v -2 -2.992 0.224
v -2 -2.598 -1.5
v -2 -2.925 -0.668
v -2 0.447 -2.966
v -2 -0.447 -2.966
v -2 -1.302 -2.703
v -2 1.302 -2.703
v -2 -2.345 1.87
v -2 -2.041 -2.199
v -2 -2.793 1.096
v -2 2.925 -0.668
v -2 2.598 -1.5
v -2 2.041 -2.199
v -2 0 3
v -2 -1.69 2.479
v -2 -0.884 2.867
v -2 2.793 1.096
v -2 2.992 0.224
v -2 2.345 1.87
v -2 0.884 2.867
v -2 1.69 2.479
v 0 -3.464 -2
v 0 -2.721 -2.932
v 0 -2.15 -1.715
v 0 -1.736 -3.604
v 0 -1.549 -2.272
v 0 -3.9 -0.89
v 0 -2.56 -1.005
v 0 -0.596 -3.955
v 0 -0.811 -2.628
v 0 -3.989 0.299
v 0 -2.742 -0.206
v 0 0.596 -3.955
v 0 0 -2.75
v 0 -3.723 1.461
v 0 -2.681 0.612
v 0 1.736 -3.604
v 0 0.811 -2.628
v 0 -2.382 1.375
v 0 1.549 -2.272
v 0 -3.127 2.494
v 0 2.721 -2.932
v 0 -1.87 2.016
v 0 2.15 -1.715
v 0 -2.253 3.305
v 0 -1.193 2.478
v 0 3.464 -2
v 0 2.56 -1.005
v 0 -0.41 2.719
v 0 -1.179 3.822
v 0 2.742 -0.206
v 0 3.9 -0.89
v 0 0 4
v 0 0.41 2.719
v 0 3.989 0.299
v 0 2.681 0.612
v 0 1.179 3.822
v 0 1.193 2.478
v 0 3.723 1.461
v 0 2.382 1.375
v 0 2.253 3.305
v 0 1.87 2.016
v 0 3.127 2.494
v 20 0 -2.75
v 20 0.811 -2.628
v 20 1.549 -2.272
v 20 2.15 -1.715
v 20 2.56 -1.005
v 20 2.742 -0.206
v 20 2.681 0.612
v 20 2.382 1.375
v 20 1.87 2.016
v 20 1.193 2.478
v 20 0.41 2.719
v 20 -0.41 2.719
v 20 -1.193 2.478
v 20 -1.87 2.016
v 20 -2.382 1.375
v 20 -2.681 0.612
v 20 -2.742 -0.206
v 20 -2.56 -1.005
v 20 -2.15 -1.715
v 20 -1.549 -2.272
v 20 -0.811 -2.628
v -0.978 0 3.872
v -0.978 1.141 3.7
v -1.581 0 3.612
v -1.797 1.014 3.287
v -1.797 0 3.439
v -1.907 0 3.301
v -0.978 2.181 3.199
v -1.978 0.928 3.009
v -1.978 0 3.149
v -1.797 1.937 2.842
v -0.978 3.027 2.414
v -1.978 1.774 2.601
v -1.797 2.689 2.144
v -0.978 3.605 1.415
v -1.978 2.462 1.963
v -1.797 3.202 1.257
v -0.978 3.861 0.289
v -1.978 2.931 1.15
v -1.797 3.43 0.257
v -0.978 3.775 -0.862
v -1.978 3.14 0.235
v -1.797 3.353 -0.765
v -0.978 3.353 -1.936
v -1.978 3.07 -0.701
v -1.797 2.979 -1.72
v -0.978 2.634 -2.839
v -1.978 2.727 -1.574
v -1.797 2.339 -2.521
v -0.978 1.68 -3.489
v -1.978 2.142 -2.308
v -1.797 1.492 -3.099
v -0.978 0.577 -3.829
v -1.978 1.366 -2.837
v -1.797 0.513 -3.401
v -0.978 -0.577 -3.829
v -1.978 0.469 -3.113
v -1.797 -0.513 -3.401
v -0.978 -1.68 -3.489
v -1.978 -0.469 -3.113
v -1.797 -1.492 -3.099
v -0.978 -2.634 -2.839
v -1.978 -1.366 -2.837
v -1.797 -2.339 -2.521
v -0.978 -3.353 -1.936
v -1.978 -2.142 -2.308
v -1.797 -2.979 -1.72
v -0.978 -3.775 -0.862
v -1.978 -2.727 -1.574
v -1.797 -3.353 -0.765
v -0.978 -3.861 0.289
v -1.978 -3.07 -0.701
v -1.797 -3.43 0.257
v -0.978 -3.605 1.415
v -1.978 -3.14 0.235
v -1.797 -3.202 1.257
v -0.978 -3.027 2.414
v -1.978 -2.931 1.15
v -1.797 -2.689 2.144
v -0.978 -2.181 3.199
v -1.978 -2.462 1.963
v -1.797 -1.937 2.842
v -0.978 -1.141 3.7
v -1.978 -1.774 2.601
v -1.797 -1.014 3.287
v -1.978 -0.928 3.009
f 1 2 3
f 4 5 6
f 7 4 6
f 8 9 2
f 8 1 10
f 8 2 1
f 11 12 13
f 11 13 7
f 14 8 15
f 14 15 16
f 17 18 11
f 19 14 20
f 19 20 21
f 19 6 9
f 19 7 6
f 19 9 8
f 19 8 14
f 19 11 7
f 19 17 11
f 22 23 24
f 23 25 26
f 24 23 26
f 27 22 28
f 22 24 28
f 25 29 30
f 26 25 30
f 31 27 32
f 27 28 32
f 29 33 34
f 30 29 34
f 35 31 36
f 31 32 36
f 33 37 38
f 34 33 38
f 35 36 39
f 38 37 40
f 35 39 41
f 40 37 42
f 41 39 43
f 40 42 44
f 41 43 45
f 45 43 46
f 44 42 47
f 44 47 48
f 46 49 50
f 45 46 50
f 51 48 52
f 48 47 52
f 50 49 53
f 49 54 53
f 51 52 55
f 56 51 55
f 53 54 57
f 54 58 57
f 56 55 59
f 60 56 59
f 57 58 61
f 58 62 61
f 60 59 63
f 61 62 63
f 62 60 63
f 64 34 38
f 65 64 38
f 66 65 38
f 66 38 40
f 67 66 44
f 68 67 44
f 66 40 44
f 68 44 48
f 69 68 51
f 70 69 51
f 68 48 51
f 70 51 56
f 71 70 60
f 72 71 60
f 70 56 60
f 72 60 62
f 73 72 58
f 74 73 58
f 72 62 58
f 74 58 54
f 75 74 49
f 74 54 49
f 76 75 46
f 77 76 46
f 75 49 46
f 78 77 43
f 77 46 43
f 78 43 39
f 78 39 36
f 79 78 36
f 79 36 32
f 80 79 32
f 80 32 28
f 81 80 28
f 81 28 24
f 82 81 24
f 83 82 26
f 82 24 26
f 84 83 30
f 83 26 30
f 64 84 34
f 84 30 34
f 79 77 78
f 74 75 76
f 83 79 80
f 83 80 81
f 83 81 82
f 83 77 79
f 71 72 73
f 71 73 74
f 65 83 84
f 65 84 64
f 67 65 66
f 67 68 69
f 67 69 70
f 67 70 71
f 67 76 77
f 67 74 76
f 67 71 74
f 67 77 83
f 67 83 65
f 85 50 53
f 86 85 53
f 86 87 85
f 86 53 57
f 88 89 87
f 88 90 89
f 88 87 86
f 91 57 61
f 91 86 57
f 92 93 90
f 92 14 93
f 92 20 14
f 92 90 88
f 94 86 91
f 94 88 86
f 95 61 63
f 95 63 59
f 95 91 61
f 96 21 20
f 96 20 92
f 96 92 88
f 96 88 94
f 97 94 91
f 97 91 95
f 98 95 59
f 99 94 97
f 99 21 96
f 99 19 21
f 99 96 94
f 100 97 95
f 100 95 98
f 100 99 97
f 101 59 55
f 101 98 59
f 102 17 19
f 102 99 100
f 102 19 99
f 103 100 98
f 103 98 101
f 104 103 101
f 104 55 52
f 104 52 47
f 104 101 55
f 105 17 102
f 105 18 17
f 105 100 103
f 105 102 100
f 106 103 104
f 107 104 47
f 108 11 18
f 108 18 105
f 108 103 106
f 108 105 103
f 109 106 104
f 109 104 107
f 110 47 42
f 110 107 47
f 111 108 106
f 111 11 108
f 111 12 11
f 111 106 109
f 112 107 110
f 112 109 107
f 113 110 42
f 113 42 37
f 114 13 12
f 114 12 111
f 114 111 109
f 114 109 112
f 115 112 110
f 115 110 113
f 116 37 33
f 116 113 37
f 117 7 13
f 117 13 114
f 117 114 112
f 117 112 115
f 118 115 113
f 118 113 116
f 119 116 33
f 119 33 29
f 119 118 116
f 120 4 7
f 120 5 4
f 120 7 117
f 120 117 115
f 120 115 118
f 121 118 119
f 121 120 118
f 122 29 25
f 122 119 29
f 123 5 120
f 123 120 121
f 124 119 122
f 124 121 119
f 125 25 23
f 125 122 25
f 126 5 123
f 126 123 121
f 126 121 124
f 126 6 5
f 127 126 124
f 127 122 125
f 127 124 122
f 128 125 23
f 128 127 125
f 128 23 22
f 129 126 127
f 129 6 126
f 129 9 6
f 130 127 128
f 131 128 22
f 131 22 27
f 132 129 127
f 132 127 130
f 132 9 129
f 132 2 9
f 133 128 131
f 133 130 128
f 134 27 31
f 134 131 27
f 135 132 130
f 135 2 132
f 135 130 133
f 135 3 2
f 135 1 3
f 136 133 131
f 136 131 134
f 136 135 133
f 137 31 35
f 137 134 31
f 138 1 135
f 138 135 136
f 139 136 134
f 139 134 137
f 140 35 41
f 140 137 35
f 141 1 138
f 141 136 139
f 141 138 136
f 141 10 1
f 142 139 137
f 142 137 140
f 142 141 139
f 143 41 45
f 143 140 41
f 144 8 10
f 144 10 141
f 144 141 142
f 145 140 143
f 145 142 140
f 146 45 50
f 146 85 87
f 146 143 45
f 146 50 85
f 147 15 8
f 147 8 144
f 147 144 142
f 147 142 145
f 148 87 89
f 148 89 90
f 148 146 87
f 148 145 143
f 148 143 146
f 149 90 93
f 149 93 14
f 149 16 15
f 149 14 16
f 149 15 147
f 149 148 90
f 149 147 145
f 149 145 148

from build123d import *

# Parameters (mm, degrees)
SKETCH1_R           = 2.75
BOSS_EXTRUDE1_DEPTH = 20
SKETCH2_R           = 4
BOSS_EXTRUDE2_DEPTH = 2
FILLET1_SIZE        = 2
FILLET1_SIZE_2      = 1


with BuildPart() as part:
    # Sketch1 → Boss-Extrude1 (new body)
    with BuildSketch(Plane(origin=(0, 0, 0), x_dir=(0, 0, -1), z_dir=(1, 0, 0))):
        Circle(SKETCH1_R)
    extrude(amount=BOSS_EXTRUDE1_DEPTH)

    # Sketch2 → Boss-Extrude2 (add)
    with BuildSketch(Plane.ZY):
        Circle(SKETCH2_R)
    extrude(amount=BOSS_EXTRUDE2_DEPTH)

    # Fillet1
    # an asymmetric fillet: 2, 1 mm, written as the material it takes off along each edge
    with BuildSketch(Plane(origin=(-2, 0, 0), x_dir=(0, 0, 1), z_dir=(0, -1, 0))) as fillet1_piece_1:
        with BuildLine():
            Bezier((4, -FILLET1_SIZE), (4, 0), (4 - FILLET1_SIZE_2, 0), weights=[1, 0.707106781, 1])
            Line((4 - FILLET1_SIZE_2, 0), (4, 0))
            Line((4, 0), (4, -FILLET1_SIZE))
        make_face()
    revolve(axis=Axis((-2, 0, 0), (-1, 0, 0)), mode=Mode.SUBTRACT)


solid = part.part
